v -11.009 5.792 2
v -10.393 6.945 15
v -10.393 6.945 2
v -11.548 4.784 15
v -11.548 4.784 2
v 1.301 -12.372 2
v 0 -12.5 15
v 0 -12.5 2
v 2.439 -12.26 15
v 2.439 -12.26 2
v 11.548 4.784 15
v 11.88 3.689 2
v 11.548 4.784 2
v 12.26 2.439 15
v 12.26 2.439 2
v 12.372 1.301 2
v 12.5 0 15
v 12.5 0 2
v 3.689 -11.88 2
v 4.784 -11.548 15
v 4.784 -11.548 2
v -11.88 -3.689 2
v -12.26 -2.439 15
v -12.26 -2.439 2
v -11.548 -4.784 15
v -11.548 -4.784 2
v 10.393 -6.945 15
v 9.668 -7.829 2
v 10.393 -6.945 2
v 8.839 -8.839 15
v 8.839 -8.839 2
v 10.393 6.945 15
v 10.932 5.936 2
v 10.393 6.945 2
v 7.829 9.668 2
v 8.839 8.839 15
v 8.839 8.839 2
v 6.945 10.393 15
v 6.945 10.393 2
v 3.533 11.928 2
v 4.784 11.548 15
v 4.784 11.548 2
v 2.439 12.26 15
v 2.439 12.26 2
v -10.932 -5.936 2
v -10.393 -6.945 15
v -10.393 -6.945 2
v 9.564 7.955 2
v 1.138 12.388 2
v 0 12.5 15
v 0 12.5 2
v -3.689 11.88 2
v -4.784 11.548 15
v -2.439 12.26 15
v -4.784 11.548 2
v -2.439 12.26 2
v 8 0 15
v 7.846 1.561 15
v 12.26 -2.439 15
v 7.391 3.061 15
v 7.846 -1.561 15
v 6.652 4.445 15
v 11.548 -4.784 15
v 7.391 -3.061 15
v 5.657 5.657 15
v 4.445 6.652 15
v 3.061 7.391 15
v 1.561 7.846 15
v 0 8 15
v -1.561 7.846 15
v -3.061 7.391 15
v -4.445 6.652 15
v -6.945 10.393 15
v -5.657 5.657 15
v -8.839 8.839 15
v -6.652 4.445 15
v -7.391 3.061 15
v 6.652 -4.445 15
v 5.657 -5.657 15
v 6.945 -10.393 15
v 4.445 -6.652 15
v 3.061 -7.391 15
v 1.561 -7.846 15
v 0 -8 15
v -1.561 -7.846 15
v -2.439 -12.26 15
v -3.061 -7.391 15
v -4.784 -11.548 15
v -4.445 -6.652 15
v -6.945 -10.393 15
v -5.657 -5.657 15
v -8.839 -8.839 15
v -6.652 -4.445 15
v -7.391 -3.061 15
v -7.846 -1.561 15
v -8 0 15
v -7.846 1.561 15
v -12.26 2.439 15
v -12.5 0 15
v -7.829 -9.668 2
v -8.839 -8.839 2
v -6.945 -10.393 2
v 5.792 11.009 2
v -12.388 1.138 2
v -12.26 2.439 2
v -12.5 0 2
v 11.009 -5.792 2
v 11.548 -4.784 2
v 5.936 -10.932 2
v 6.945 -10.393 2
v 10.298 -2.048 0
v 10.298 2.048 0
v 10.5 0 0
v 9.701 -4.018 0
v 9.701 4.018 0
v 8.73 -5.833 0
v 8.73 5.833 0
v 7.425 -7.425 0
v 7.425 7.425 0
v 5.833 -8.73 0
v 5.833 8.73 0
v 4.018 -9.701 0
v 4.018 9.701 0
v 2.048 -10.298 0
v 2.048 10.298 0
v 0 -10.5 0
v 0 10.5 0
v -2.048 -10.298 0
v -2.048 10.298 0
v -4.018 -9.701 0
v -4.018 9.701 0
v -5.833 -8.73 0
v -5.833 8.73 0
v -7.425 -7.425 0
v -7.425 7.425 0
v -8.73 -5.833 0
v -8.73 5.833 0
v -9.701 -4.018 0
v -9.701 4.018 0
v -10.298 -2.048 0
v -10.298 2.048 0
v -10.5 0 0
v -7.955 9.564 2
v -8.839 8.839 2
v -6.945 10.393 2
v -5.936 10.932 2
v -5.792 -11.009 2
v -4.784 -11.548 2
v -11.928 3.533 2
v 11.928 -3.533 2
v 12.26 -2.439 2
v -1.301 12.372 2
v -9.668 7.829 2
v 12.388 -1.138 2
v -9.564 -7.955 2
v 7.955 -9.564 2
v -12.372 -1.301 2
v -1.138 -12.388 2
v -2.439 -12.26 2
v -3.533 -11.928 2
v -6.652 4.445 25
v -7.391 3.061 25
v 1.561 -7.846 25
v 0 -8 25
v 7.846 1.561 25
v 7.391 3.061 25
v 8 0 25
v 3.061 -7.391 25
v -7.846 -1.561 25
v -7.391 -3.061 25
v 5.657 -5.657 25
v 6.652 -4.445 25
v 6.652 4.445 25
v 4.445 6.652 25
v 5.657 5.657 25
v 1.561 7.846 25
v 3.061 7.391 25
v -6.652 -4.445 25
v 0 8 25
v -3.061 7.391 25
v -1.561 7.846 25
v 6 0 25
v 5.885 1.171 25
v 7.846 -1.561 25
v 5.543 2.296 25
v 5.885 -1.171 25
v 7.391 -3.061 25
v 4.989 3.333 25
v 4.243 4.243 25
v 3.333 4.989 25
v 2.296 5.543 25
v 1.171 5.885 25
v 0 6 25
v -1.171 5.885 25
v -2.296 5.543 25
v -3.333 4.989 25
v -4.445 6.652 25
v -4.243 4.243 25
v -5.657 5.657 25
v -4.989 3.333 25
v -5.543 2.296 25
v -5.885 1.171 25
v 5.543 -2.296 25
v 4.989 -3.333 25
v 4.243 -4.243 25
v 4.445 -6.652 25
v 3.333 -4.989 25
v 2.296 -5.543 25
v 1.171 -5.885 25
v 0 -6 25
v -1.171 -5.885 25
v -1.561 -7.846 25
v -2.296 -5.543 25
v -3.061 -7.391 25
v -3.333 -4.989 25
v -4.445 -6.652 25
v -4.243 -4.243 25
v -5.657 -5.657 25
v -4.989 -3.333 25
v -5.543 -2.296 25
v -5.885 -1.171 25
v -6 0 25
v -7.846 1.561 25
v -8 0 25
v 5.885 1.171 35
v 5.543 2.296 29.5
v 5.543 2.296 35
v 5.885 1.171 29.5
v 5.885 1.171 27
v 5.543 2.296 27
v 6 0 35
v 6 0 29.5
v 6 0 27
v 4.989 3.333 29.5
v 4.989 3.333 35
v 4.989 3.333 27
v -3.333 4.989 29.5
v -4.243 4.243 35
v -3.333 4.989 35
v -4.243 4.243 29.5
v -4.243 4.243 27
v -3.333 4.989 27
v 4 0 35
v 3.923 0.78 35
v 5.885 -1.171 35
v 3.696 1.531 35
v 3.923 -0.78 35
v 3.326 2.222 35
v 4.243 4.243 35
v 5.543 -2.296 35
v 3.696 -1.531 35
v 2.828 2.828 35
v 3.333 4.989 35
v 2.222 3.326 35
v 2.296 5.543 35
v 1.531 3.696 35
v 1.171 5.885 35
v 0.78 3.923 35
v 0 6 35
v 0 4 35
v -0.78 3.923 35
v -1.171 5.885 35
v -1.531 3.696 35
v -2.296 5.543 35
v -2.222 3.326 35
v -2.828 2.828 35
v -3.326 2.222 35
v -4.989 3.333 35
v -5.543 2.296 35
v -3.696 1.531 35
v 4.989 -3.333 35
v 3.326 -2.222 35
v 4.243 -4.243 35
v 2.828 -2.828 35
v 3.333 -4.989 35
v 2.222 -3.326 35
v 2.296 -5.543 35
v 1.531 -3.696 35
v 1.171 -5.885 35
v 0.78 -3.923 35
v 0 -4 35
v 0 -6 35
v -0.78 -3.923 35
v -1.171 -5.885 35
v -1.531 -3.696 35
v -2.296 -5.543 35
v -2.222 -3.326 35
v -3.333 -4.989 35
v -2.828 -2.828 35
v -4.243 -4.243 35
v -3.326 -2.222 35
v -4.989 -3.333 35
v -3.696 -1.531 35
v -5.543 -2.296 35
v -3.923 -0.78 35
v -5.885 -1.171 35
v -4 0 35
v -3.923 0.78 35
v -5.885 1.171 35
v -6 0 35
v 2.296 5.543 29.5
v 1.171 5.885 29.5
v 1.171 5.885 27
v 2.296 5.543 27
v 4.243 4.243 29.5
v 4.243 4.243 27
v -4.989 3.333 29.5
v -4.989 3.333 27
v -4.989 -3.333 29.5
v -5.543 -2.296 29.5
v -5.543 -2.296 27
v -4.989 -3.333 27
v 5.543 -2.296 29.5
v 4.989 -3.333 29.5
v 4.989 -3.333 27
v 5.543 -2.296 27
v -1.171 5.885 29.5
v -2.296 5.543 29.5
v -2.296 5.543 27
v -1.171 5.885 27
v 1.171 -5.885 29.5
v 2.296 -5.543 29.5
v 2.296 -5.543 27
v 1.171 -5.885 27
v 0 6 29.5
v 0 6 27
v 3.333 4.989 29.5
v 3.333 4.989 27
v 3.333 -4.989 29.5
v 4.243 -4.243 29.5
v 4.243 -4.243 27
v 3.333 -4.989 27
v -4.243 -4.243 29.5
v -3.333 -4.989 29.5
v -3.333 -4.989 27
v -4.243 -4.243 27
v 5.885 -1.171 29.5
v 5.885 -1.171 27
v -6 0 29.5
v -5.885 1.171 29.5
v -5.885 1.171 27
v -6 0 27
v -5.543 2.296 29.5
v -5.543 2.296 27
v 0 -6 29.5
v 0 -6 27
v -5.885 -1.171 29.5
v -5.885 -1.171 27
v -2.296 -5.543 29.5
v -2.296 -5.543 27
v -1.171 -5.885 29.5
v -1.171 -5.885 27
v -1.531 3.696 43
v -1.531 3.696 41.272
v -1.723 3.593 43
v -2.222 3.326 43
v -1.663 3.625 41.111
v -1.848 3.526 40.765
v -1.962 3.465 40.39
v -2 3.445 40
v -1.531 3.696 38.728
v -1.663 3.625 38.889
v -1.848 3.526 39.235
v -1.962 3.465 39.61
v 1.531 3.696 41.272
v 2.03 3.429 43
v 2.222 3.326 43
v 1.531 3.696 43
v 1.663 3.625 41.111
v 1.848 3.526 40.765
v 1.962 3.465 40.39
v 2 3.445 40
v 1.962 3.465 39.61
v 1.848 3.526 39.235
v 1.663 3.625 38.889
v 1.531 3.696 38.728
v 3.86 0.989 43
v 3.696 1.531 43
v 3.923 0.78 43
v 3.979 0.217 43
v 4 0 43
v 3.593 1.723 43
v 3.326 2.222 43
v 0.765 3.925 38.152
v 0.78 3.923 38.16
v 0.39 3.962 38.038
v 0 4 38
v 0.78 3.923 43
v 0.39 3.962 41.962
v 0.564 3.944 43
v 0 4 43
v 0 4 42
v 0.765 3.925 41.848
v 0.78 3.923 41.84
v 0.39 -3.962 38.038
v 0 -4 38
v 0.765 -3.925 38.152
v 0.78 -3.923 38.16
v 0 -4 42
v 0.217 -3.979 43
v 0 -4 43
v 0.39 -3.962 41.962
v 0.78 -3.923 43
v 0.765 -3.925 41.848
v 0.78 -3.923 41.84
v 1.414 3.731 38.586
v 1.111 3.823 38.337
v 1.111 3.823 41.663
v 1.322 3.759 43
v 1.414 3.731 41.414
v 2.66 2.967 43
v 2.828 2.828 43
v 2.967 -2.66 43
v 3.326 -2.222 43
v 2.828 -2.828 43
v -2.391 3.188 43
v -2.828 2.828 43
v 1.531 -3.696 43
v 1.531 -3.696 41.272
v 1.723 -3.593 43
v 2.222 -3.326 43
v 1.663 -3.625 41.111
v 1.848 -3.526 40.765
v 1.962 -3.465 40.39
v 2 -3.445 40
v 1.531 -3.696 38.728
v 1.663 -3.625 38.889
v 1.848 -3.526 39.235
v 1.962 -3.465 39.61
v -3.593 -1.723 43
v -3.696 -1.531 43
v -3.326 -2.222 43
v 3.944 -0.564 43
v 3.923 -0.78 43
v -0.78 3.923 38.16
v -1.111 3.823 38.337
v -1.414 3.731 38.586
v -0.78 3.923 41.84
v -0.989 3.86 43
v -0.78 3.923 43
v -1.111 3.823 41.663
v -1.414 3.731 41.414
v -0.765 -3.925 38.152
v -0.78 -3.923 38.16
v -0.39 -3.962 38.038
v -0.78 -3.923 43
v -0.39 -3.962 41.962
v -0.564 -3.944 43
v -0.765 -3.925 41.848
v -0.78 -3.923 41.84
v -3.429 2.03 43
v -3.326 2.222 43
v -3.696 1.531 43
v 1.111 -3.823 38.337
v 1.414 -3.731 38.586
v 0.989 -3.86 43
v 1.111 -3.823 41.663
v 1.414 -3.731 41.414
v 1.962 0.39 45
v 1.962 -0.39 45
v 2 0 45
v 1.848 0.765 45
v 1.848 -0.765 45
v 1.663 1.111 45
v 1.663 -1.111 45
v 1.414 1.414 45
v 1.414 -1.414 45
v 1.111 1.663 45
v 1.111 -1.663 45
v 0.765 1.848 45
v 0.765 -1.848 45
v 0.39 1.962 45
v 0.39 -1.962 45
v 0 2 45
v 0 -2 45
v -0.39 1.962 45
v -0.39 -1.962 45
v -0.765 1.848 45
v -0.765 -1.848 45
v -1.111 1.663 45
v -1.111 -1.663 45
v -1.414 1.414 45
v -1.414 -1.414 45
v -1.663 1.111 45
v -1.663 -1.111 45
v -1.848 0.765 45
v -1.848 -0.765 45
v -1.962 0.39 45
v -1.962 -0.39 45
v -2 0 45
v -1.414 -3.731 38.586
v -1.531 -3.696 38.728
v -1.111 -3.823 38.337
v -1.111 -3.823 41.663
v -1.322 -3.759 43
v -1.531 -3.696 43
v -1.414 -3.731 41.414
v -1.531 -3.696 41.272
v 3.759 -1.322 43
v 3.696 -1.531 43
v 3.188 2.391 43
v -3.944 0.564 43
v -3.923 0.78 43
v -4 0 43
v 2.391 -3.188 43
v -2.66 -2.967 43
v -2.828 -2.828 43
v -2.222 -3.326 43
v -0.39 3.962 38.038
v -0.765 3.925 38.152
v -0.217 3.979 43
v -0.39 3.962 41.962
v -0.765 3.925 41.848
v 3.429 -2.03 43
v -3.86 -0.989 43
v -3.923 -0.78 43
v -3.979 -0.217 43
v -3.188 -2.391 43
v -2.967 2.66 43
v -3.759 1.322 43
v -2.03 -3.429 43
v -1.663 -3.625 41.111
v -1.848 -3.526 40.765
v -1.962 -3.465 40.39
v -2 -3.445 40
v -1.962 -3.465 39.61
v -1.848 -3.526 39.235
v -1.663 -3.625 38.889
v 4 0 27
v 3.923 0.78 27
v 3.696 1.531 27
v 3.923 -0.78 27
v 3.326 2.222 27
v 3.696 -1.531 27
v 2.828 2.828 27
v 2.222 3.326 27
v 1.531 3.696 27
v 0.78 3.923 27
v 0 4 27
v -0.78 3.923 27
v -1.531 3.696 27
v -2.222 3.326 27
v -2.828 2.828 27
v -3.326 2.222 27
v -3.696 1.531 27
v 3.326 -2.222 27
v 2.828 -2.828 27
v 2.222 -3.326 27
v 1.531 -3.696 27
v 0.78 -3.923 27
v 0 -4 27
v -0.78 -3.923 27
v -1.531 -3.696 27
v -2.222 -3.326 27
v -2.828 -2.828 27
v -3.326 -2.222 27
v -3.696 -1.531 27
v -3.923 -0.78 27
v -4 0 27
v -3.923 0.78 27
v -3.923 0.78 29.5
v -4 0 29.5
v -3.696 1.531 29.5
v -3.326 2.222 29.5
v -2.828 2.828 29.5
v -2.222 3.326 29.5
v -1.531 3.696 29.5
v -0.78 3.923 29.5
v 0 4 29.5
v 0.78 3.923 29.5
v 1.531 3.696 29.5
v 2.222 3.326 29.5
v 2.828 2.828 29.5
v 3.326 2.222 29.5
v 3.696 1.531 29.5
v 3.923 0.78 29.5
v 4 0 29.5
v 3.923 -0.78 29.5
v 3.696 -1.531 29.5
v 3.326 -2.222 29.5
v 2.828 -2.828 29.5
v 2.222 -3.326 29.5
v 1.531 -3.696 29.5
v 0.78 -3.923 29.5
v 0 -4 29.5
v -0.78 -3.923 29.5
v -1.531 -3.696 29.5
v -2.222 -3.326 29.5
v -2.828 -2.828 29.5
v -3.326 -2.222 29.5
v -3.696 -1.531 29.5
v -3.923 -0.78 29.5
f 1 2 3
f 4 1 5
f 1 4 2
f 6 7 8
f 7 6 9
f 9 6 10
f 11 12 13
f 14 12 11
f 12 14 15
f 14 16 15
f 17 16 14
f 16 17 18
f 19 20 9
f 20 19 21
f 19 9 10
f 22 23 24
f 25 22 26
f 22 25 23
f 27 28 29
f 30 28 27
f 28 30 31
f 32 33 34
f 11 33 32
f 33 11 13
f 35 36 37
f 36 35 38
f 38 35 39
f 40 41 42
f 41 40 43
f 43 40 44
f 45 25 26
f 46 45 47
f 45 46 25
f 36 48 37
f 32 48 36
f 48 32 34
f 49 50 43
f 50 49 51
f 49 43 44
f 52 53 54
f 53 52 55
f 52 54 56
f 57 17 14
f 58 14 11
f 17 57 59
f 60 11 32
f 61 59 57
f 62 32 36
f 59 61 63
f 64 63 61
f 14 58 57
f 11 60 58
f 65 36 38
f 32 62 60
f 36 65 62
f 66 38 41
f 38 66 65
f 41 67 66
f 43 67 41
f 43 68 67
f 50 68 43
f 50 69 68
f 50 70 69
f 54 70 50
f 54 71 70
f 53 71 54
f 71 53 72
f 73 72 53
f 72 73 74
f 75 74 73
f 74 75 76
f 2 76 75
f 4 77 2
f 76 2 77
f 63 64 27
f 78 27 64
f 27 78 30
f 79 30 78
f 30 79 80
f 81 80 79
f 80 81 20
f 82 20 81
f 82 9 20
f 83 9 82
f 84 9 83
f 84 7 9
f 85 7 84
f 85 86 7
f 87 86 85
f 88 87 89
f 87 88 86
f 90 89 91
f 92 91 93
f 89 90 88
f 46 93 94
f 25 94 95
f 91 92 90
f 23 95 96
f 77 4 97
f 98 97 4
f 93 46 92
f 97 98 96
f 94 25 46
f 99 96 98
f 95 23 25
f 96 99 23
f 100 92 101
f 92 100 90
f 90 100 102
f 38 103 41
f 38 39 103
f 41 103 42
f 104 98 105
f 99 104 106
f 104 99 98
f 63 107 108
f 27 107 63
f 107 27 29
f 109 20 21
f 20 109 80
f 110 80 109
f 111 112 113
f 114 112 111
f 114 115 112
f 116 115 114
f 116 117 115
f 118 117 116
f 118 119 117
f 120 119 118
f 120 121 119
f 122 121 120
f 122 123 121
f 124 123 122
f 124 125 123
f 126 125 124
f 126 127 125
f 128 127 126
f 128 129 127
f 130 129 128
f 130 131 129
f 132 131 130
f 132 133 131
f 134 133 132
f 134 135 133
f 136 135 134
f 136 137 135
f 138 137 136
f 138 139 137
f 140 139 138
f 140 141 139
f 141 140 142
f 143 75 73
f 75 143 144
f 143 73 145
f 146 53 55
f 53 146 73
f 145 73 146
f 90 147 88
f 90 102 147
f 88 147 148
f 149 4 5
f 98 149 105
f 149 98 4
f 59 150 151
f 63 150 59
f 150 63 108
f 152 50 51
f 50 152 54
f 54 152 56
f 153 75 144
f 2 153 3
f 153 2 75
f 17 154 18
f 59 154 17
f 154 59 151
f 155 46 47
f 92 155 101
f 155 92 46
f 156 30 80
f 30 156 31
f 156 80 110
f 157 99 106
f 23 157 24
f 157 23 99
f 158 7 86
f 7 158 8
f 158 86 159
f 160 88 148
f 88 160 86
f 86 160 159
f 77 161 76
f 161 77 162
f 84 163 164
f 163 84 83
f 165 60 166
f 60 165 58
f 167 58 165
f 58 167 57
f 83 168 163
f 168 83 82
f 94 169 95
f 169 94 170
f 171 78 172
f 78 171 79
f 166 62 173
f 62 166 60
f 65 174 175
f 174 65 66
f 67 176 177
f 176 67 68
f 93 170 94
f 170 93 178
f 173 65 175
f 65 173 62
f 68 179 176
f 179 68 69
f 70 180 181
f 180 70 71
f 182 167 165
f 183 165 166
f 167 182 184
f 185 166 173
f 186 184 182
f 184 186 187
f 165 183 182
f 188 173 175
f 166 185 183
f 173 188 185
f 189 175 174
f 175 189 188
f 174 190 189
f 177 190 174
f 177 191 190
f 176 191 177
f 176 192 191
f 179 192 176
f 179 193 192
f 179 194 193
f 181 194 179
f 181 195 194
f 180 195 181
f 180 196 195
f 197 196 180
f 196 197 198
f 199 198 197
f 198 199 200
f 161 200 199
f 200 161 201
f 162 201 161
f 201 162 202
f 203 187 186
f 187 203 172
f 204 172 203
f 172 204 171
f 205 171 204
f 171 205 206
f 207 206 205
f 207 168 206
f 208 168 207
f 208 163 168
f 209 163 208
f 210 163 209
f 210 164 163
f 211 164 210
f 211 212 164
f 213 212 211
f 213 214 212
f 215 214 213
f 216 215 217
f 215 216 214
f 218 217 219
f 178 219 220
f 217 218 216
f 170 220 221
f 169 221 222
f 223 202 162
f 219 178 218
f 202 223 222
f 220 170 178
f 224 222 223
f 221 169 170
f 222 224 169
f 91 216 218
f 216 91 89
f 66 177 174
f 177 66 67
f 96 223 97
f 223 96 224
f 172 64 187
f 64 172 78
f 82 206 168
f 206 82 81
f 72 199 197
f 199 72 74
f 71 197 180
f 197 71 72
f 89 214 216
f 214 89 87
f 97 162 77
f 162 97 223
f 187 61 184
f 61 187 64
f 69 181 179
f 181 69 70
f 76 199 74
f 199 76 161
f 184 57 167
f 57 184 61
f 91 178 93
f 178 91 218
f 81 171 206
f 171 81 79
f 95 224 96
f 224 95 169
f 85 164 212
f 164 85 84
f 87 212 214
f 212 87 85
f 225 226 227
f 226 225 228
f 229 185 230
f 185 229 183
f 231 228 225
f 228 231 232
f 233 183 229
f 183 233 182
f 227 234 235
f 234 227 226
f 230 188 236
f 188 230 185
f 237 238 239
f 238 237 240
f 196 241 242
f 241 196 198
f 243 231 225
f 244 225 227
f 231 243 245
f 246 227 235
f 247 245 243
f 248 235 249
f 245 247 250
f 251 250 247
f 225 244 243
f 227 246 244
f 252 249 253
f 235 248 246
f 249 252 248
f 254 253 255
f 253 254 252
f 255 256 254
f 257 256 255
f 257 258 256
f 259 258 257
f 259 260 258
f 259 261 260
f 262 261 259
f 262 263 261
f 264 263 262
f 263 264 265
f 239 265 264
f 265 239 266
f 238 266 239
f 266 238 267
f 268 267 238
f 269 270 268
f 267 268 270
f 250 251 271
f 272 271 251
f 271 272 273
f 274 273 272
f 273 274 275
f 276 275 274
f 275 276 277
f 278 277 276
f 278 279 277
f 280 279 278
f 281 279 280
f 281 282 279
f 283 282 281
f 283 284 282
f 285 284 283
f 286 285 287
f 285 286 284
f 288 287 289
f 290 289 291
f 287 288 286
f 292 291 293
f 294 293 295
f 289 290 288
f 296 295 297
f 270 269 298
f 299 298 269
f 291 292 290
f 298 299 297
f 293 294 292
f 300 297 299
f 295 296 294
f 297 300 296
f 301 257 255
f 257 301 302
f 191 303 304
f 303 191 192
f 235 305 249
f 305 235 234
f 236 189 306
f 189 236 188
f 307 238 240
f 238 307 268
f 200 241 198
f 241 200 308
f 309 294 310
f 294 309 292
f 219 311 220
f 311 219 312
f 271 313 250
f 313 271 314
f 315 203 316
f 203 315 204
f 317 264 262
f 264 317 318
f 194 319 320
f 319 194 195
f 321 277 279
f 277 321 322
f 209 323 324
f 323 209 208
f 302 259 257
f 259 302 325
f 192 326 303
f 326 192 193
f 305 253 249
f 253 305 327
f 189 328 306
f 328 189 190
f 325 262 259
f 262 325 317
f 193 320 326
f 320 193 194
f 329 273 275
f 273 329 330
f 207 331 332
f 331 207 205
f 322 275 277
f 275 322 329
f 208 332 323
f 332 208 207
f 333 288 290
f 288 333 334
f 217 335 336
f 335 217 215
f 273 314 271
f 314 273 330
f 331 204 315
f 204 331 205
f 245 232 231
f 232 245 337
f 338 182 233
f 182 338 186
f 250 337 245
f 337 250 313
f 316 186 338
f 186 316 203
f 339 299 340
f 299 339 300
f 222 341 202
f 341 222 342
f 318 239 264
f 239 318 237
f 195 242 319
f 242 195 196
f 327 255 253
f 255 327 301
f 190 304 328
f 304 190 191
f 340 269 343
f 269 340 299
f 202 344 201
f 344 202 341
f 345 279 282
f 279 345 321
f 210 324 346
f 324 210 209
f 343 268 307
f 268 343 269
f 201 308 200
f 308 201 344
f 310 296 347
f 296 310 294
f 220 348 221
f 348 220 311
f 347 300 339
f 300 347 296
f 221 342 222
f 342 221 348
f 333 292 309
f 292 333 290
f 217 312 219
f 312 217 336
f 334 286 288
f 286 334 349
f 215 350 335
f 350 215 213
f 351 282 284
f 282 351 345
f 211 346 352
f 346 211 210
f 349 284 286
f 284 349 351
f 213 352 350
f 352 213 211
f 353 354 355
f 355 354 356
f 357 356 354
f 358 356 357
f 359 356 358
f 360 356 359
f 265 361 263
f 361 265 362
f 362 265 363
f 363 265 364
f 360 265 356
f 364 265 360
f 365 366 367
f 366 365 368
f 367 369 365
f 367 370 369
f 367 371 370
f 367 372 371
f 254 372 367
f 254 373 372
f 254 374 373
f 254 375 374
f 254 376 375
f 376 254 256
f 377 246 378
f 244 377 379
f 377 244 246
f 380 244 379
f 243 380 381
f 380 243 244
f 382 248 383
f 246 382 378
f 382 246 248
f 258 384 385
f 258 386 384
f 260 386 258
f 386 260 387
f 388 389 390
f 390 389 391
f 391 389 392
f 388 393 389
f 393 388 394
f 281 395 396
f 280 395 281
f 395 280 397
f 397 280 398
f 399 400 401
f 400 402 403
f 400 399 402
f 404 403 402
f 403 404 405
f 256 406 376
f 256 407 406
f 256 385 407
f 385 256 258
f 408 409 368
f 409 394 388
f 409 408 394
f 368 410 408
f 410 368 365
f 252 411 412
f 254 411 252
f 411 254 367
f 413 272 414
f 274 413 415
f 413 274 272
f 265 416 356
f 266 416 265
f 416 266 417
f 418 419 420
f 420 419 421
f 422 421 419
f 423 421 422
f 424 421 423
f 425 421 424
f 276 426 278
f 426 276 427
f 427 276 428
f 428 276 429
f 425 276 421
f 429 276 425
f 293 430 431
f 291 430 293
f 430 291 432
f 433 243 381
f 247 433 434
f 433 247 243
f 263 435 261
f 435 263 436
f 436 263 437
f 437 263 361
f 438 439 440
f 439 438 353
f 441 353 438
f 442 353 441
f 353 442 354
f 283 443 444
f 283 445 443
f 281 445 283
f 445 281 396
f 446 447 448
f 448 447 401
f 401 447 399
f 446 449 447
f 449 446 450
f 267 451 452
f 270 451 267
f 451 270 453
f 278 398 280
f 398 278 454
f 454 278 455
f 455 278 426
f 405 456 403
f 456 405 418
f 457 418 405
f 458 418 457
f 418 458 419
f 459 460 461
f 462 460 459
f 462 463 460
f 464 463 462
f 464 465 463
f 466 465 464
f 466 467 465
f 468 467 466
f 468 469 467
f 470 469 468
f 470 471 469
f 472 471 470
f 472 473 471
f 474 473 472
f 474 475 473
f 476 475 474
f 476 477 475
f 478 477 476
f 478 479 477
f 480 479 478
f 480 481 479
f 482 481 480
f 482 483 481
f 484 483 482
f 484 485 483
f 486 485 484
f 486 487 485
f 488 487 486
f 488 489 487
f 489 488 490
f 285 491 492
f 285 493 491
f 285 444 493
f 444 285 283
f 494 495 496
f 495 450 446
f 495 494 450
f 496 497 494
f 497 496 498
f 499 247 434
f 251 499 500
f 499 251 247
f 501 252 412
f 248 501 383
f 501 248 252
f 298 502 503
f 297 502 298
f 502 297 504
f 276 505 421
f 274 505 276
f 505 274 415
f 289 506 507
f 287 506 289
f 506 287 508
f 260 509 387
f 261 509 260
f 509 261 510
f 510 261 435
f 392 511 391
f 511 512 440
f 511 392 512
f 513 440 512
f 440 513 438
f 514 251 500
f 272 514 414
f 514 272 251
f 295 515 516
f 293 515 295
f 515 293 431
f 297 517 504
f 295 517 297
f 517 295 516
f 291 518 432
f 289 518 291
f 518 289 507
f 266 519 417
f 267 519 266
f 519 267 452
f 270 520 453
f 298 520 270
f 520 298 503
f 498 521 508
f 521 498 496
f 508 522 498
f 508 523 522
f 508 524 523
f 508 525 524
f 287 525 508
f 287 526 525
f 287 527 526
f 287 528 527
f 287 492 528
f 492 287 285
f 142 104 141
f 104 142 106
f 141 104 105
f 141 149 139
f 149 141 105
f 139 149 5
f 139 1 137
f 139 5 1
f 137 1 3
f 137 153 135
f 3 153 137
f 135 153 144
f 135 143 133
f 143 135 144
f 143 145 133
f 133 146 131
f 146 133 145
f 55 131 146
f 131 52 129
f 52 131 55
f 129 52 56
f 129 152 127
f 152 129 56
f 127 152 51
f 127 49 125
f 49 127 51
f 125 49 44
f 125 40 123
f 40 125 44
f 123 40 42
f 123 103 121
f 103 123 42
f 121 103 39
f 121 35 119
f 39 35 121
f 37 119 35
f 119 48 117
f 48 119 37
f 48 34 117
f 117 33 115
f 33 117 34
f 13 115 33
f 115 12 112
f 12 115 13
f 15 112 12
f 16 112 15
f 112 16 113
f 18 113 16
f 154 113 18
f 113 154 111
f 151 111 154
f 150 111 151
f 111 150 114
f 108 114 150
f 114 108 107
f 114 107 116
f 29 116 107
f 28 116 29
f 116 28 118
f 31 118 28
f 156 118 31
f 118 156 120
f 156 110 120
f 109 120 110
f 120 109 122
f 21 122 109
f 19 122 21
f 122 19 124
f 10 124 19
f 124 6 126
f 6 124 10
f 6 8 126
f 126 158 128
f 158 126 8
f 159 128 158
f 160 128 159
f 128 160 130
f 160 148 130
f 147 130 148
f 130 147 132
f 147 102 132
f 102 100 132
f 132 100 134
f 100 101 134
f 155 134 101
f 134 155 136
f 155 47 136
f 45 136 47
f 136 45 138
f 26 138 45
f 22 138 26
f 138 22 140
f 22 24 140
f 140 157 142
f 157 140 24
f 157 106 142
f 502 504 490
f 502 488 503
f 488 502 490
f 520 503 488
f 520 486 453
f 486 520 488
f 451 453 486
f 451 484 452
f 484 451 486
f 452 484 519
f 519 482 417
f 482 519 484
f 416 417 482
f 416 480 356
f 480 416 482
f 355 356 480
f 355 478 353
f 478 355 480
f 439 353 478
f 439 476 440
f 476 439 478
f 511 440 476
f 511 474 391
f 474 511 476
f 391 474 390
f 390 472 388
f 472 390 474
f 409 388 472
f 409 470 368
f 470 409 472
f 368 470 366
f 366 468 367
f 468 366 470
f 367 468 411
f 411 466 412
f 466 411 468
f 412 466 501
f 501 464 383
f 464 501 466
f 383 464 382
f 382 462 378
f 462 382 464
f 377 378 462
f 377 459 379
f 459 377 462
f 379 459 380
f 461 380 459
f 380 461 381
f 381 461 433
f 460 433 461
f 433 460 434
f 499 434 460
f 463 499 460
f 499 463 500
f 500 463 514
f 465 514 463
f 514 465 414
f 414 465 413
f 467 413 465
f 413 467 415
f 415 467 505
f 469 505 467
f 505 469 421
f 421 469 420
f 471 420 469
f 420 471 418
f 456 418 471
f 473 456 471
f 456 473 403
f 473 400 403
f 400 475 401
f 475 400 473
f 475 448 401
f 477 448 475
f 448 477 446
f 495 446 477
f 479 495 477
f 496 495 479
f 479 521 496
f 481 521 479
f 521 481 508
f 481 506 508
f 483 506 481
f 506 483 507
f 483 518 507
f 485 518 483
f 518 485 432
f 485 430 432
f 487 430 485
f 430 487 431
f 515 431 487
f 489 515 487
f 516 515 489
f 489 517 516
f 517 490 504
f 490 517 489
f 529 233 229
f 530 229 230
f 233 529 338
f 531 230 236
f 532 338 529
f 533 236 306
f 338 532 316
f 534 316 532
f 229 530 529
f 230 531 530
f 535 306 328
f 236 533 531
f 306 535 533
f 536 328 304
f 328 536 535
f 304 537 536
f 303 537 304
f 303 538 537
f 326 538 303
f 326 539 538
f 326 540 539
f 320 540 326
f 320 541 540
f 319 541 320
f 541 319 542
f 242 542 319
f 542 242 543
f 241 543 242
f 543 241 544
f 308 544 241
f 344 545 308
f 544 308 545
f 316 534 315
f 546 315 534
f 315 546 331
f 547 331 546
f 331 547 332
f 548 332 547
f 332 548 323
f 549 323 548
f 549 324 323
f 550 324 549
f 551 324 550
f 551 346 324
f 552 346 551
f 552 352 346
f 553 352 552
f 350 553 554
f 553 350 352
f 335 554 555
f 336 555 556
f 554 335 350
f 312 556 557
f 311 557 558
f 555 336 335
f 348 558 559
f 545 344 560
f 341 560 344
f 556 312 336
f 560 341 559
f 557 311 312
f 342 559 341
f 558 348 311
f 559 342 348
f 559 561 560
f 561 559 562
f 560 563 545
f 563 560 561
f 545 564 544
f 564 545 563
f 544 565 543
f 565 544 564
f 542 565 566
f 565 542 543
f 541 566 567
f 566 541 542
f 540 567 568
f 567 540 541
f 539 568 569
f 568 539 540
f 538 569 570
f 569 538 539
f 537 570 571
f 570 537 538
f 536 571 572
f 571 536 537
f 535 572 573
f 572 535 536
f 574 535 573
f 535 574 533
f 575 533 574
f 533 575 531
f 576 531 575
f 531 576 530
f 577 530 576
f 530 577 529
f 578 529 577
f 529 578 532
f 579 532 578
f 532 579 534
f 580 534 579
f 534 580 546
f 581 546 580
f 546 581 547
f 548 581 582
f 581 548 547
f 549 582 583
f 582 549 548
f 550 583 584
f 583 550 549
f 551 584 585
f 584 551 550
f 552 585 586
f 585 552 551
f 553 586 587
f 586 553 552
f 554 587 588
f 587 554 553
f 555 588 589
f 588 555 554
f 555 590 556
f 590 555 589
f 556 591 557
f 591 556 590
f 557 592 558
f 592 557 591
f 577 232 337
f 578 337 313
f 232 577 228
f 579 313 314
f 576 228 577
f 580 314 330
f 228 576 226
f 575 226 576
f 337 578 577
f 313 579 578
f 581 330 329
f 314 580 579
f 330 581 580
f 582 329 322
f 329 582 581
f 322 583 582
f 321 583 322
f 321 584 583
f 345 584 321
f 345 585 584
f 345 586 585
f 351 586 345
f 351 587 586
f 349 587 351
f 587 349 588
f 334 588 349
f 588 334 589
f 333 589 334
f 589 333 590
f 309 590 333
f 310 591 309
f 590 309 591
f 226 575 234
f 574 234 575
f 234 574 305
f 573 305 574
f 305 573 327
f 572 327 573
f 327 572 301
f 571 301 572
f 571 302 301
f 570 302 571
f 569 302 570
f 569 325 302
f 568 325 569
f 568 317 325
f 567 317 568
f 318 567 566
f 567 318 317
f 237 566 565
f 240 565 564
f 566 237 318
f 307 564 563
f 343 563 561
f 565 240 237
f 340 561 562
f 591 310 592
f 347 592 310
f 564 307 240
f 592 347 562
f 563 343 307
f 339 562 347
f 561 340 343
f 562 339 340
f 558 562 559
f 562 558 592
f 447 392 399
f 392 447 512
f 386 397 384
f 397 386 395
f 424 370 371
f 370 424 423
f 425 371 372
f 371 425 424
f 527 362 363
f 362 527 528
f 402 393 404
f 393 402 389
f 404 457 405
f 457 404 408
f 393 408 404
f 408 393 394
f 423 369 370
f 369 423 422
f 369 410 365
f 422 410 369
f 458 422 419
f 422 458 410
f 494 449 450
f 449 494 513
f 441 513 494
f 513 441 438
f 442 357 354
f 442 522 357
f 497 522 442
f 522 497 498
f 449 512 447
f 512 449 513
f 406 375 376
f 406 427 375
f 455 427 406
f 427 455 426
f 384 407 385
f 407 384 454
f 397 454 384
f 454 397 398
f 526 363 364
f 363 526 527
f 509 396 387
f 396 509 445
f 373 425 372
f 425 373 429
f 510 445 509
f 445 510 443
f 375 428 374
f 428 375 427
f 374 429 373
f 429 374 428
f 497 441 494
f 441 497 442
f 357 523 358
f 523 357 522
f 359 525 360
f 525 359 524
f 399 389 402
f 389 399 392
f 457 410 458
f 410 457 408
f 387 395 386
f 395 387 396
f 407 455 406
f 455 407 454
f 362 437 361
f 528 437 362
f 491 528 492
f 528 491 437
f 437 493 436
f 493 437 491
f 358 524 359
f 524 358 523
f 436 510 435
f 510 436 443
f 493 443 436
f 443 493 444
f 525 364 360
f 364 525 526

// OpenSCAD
$fn = 32;

// ----------------------------------------------------------------------
// Stepped shaft: diameters 25, 16, 12, 8 mm, 45 mm long
// ----------------------------------------------------------------------

// --- parameters (mm) ---
d1 = 25;                  // step 1 diameter
len1 = 15;                // step 1 length
d2 = 16;                  // step 2 diameter
len2 = 10;                // step 2 length
d3 = 12;                  // step 3 diameter
len3 = 10;                // step 3 length
d4 = 8;                   // step 4 diameter
len4 = 10;                // step 4 length
total = 45;               // overall length
chamfer = 2;              // end chamfer
groove_r = 6;             // groove radius
groove_z = 27;            // groove position from the end
groove_w = 2.5;           // groove width
groove_d = 2;             // groove depth
cross_d = 4;              // cross pin hole
cross_z = 40;             // cross hole position

difference() {
  /* turned body: stacked cylinders, every step sunk into the bigger one */
  union() {
    cylinder(h = len1, d = d1);
    translate([0, 0, 14.6]) cylinder(h = 10.4, d = d2);
    translate([0, 0, 24.6]) cylinder(h = 10.4, d = d3);
    translate([0, 0, 34.6]) cylinder(h = 10.4, d = d4);
  }
  /* bottom chamfer ring cut */
  rotate_extrude() translate([10.5, -2.5]) polygon([[0, 0], [4.5, 0], [4.5, 7], [0, 2.5]]);
  /* top chamfer ring cut */
  rotate_extrude() translate([2, 45]) polygon([[0, 0], [4.5, -4.5], [4.5, 2.5], [0, 2.5]]);
  /* circlip groove just behind the shoulder */
  rotate_extrude() translate([groove_r - groove_d, groove_z]) square([groove_d + 2.5, groove_w]);
  /* cross pin hole through the small step */
  translate([0, 0, cross_z]) rotate([90, 0, 0]) cylinder(h = d4 + 5, d = cross_d, center = true);
}
